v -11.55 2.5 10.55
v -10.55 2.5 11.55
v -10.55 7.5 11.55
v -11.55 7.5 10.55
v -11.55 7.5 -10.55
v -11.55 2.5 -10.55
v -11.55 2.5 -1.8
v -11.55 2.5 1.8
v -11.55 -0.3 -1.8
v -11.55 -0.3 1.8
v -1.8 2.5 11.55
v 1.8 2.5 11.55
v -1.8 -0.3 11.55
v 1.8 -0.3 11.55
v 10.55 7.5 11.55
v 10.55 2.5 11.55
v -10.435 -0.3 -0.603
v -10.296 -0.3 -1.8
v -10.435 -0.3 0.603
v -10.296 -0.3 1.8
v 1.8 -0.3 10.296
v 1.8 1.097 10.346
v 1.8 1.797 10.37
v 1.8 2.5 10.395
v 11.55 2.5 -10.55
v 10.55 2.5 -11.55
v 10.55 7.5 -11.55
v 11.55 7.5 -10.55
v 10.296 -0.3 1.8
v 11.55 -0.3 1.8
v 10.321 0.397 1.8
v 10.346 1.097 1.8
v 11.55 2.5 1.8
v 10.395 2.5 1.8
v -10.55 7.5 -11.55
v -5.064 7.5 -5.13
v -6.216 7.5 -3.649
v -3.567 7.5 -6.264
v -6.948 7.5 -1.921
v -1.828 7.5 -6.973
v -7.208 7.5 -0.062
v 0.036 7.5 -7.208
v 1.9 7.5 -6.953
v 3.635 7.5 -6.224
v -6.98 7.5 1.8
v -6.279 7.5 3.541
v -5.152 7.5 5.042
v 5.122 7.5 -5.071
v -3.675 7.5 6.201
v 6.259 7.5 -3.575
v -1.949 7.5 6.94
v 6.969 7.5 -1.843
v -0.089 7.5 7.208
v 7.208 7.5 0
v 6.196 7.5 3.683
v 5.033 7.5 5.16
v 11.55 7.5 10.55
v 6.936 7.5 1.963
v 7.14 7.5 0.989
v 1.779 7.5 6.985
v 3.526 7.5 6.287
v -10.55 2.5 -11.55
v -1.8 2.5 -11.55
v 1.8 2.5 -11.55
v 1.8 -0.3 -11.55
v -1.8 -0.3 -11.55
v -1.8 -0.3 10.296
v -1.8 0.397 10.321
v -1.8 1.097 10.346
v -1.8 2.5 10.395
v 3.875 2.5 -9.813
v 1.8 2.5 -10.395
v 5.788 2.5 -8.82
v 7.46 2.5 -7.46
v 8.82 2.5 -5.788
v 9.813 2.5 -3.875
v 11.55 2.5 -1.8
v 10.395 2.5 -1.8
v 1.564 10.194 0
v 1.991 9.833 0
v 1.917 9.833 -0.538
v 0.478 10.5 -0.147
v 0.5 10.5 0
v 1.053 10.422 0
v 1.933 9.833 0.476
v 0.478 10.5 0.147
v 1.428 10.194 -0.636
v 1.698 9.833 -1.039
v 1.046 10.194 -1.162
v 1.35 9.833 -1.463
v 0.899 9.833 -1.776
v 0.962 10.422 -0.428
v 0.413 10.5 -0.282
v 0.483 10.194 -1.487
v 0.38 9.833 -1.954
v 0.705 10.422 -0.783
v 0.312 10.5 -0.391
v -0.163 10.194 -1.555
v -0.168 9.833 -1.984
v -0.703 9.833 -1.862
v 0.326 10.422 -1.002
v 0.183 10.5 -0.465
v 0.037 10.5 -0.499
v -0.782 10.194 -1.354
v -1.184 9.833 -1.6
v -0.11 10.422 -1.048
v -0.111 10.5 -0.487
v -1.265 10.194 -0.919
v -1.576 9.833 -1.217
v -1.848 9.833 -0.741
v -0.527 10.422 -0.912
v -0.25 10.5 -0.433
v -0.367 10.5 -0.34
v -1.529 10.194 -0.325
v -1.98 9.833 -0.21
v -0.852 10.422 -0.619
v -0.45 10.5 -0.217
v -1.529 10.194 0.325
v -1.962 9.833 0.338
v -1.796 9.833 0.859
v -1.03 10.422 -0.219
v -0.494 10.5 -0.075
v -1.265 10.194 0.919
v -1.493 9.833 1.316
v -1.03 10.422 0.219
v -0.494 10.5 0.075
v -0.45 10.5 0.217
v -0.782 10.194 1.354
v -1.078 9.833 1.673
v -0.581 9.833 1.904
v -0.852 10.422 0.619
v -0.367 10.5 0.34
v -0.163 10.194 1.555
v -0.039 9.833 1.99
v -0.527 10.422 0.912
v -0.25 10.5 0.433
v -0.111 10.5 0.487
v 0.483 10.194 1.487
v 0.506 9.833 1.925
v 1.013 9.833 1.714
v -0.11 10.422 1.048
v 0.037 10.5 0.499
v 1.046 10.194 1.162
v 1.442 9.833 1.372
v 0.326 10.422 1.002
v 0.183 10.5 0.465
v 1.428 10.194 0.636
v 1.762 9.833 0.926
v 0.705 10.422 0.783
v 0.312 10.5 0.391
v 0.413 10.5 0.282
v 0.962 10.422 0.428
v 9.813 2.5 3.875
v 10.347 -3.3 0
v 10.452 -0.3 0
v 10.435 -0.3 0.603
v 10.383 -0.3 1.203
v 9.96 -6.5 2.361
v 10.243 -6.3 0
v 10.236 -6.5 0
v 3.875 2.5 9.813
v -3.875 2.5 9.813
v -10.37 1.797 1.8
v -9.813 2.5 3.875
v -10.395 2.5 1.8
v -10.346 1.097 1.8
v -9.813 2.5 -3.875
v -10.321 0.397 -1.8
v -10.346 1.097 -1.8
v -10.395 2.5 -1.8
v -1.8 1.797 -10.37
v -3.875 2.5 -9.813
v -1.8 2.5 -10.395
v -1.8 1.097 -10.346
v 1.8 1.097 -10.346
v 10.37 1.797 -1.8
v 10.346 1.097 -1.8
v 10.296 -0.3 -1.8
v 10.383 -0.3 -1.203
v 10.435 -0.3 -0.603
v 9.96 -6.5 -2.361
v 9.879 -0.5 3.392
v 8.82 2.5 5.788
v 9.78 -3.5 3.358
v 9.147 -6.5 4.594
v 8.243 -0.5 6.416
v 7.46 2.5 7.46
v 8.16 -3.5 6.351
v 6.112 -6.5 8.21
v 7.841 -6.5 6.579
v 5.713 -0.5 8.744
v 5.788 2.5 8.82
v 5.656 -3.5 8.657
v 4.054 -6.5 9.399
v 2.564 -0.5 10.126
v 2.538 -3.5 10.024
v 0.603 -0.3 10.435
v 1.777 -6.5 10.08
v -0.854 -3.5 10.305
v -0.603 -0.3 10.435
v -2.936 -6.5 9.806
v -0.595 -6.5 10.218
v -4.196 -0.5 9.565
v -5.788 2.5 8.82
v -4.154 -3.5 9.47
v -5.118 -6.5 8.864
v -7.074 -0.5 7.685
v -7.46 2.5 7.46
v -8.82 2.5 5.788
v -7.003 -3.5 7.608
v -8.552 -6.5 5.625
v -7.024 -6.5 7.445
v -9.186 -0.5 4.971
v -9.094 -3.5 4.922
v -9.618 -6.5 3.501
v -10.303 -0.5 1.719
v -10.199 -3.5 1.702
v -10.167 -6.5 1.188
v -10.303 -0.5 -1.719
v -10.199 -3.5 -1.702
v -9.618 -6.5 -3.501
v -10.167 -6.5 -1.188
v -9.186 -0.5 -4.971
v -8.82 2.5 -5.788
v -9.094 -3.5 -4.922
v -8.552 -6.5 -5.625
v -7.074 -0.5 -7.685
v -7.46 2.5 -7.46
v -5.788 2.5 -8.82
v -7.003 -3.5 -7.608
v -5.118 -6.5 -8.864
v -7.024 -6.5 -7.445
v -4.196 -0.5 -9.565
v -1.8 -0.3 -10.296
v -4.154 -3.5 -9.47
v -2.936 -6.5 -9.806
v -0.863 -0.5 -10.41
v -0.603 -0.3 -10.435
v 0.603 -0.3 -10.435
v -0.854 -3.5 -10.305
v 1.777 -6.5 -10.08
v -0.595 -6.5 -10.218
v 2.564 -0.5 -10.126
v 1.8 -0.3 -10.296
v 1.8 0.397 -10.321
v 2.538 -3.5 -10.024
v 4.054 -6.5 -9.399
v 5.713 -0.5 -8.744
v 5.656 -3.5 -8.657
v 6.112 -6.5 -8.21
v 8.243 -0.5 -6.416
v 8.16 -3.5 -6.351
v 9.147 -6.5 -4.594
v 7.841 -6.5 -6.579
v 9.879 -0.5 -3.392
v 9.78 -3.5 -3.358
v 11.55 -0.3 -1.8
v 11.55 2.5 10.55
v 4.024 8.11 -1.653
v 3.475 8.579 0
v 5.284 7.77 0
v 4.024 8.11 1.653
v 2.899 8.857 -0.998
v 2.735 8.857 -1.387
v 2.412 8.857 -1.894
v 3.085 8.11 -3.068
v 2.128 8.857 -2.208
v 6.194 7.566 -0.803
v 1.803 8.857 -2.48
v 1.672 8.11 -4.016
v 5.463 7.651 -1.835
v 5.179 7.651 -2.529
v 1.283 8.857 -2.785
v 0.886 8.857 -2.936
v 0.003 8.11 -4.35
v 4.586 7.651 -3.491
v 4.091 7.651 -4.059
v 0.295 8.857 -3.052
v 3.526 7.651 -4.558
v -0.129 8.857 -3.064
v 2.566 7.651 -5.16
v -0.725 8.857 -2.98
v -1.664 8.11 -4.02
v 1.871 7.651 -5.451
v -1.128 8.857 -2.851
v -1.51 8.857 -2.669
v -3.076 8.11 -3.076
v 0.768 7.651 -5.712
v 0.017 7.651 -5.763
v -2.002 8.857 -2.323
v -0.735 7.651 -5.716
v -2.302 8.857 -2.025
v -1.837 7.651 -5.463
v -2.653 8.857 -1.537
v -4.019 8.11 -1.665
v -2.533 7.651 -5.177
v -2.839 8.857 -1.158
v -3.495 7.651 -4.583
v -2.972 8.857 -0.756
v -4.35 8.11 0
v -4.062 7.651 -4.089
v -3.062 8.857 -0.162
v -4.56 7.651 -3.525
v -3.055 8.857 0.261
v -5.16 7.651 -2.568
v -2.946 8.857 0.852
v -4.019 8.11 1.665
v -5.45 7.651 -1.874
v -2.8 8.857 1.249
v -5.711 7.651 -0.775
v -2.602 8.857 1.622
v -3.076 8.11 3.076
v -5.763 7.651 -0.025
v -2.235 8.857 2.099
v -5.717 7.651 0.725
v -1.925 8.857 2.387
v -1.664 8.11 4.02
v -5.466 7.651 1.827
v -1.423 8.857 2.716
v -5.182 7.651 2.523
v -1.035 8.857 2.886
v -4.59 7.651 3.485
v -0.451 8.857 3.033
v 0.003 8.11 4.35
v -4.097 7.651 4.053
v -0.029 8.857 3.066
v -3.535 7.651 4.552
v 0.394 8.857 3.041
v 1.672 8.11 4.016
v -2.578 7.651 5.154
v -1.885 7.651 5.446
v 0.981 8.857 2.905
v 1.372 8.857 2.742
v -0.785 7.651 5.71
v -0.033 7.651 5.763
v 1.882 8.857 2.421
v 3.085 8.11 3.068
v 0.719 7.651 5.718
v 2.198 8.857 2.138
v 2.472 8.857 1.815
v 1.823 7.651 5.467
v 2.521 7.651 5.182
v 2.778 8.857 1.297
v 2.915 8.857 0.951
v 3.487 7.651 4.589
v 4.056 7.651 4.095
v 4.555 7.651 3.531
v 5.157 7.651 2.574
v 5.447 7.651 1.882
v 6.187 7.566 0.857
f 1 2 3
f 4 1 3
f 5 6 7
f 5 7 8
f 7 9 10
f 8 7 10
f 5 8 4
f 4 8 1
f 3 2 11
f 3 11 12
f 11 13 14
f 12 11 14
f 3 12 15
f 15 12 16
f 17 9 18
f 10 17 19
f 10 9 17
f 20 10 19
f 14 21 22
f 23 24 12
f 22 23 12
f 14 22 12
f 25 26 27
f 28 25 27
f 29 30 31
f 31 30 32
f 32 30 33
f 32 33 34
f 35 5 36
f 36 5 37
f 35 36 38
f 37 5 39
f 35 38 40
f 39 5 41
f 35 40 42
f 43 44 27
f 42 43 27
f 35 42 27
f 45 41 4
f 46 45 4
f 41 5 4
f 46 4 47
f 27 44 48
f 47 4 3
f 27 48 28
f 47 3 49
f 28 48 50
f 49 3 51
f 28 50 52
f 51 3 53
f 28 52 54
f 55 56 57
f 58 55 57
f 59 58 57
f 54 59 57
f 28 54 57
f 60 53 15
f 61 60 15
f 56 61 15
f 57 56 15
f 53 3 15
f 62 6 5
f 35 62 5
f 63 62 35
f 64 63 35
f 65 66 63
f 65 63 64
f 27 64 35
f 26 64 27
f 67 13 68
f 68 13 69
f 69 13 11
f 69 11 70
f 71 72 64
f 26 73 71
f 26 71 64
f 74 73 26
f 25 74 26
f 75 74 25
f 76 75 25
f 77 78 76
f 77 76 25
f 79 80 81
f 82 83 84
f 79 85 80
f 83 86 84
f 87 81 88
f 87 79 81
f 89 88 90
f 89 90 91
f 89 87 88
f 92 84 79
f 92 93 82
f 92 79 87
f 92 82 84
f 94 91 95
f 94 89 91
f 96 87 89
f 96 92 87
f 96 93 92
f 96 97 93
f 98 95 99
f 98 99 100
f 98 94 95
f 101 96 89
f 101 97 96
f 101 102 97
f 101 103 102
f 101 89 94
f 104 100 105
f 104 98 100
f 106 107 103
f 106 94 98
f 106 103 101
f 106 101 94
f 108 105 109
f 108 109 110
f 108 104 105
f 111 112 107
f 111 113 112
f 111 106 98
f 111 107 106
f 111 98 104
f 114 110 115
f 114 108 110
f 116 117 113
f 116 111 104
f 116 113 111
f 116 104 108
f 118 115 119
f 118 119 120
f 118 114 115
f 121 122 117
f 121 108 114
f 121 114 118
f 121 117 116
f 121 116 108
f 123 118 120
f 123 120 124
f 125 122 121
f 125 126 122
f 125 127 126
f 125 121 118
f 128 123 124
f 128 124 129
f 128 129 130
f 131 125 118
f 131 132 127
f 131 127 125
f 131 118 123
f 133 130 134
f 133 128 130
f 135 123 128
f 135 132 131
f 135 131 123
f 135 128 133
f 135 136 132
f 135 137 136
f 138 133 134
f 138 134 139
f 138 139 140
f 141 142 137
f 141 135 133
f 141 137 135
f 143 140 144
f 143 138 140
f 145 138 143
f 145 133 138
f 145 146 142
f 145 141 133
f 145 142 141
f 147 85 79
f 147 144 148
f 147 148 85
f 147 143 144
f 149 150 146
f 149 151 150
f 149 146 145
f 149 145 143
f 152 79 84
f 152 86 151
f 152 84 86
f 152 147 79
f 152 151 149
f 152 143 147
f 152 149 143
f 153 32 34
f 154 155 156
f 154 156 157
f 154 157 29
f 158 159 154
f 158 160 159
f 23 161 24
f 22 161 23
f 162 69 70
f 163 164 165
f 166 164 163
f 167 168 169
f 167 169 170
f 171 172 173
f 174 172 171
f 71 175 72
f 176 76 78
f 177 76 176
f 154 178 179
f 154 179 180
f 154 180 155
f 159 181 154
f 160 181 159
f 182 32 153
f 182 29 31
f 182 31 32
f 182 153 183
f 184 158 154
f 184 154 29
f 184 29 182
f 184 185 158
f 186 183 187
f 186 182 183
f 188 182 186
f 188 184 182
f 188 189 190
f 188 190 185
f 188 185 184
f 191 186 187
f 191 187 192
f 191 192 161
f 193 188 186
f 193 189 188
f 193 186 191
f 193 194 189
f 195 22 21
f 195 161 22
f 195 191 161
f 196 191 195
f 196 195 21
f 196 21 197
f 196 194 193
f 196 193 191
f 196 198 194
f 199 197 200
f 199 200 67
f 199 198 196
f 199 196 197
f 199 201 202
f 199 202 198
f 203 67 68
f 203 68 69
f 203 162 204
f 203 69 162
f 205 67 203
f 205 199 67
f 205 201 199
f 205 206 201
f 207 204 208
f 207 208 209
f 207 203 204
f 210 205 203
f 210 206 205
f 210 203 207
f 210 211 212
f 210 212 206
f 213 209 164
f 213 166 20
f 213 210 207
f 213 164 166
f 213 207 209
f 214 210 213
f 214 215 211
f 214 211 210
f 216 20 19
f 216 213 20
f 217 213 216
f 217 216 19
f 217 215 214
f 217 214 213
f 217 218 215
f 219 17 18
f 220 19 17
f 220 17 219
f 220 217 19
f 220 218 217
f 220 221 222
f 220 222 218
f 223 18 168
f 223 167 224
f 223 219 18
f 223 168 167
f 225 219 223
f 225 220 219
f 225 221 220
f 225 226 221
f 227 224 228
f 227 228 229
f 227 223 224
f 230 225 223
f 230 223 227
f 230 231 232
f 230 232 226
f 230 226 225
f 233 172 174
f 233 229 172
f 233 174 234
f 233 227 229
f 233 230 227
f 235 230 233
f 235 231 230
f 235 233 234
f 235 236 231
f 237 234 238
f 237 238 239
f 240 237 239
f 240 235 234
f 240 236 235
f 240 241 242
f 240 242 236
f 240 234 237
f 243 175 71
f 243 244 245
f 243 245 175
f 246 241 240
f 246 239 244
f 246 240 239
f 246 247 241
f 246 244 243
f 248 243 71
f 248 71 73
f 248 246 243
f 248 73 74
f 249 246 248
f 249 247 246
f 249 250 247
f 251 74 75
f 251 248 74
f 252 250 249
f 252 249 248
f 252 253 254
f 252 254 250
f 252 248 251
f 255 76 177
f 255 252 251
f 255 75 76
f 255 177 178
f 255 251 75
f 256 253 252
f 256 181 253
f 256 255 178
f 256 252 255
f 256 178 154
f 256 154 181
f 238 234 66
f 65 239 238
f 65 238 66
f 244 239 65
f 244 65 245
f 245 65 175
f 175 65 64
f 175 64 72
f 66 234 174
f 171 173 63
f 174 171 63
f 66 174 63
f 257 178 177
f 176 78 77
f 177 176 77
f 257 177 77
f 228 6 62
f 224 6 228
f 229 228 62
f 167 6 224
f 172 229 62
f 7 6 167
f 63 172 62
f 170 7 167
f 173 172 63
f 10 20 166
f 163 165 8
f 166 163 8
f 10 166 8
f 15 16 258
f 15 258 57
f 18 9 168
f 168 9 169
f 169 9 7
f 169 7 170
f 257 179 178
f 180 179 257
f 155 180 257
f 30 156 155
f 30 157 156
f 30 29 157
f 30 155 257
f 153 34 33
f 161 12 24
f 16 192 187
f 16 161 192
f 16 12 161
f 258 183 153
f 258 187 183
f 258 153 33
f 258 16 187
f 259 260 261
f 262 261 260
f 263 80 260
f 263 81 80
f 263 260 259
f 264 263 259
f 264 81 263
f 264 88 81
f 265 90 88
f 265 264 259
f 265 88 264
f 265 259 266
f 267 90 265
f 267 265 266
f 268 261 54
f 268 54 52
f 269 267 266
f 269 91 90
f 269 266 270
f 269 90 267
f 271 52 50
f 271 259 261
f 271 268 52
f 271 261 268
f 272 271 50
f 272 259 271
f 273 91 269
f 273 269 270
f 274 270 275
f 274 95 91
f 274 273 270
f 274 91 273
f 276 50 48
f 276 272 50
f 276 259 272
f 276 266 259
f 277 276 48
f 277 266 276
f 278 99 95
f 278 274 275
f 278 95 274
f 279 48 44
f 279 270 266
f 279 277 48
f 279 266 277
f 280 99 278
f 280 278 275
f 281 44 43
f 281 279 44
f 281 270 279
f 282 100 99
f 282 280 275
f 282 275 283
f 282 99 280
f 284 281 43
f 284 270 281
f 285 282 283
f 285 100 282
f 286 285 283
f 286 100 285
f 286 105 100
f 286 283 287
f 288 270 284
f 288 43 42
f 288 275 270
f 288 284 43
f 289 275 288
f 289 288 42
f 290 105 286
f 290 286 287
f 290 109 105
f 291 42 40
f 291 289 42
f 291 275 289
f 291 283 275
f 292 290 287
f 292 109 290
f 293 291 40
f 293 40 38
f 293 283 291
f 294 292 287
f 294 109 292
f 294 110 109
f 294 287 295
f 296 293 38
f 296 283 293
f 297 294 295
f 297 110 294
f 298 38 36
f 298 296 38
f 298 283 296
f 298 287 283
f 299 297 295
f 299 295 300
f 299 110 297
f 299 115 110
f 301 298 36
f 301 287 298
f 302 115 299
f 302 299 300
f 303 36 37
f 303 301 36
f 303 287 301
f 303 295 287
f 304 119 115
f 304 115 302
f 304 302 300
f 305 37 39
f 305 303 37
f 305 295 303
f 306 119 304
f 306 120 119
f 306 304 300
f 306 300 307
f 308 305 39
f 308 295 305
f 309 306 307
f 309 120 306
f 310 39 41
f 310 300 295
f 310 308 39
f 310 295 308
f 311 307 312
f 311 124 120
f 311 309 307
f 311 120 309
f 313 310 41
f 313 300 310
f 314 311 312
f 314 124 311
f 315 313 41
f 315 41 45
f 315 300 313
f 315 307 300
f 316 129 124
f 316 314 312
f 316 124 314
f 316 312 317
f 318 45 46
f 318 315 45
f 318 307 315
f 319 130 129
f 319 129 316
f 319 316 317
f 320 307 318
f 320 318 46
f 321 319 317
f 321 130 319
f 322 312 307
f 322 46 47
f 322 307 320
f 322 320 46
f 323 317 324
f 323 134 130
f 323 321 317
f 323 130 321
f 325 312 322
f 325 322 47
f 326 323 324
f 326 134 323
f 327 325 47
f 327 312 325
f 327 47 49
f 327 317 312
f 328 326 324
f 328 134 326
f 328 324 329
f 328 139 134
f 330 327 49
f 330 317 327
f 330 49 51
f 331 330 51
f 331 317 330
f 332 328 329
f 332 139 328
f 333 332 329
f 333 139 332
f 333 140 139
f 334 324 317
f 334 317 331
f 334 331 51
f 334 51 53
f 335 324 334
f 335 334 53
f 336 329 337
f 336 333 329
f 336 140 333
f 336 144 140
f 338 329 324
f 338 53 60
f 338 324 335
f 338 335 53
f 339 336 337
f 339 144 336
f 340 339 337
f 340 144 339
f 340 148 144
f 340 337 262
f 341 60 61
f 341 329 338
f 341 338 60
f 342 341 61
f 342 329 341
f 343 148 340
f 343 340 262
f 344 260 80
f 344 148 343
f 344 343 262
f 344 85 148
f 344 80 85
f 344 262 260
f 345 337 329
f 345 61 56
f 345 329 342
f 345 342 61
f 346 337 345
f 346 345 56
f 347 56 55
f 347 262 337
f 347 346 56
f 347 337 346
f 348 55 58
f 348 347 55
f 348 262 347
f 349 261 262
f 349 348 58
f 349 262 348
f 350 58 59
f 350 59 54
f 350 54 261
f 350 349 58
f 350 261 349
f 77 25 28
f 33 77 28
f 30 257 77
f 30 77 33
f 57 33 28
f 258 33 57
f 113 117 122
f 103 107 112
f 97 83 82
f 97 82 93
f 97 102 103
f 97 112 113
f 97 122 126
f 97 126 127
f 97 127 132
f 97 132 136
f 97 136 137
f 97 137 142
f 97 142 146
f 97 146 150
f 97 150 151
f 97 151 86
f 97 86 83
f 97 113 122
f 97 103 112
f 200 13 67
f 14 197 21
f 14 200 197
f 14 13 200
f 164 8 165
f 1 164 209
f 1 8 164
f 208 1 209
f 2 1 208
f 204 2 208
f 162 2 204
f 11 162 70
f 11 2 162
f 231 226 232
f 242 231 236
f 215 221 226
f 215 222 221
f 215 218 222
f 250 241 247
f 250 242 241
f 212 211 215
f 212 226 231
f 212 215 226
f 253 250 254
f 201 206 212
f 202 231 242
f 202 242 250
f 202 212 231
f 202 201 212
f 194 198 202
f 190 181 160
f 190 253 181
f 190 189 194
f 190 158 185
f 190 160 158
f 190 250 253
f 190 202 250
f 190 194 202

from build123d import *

# Parameters (mm, degrees)
PAD011_DEPTH    = 2.8
SKETCH021_W     = 23.1
SKETCH021_H     = 23.1
PAD012_DEPTH    = 5
SKETCH023_R     = 2.5
PAD013_DEPTH    = 3
FILLET_R        = 2
FILLET001_R     = 7
SKETCH025_R     = 10.55
PAD014_DEPTH    = 9
PAD014_TAPER    = 2
CHAMFER006_SIZE = 1


with BuildPart() as part:
    # Sketch020 → Pad011 (new body)
    with BuildSketch(Plane.XZ):
        Polygon((-1.8, 11.55), (-1.8, 1.8), (-11.55, 1.8), (-11.55, -1.8), (-1.8, -1.8), (-1.8, -11.55), (1.8, -11.55), (1.8, -1.8), (11.55, -1.8), (11.55, 1.8), (1.8, 1.8), (1.8, 11.55), align=None)
    extrude(amount=PAD011_DEPTH)

    # Sketch021 → Pad012 (join)
    with BuildSketch(Plane.XZ):
        Rectangle(SKETCH021_W, SKETCH021_H)
    extrude(amount=-PAD012_DEPTH)

    # Sketch023 (on Face7 of Pad012) → Pad013 (join)
    with BuildSketch(Plane(origin=(0, 5, 0), x_dir=(1, 0, 0), z_dir=(0, 1, 0))):
        Circle(SKETCH023_R)
    extrude(amount=PAD013_DEPTH)

    # Fillet
    fillet_edges = [part.edges().sort_by_distance(p)[0] for p in [
        (-2.5, 8, 0),
    ]]
    fillet(fillet_edges, radius=FILLET_R)

    # Fillet001
    fillet001_edges = [part.edges().sort_by_distance(p)[0] for p in [
        (-2.5, 5, 0),
    ]]
    fillet(fillet001_edges, radius=FILLET001_R)

    # Sketch025 → Pad014 (join)
    with BuildSketch(Plane.XZ):
        Circle(SKETCH025_R)
    extrude(amount=PAD014_DEPTH, taper=PAD014_TAPER)

    # Chamfer006
    chamfer006_edges = [part.edges().sort_by_distance(p)[0] for p in [
        (-11.55, 2.5, 11.55),
        (-11.55, 2.5, -11.55),
        (11.55, 2.5, 11.55),
        (11.55, 2.5, -11.55),
    ]]
    chamfer(chamfer006_edges, length=CHAMFER006_SIZE)


with BuildPart() as part_1:
    # Body012 placement: moved
    add(part.part.moved(Location((0, 2.5, 0))))


solid = part_1.part
